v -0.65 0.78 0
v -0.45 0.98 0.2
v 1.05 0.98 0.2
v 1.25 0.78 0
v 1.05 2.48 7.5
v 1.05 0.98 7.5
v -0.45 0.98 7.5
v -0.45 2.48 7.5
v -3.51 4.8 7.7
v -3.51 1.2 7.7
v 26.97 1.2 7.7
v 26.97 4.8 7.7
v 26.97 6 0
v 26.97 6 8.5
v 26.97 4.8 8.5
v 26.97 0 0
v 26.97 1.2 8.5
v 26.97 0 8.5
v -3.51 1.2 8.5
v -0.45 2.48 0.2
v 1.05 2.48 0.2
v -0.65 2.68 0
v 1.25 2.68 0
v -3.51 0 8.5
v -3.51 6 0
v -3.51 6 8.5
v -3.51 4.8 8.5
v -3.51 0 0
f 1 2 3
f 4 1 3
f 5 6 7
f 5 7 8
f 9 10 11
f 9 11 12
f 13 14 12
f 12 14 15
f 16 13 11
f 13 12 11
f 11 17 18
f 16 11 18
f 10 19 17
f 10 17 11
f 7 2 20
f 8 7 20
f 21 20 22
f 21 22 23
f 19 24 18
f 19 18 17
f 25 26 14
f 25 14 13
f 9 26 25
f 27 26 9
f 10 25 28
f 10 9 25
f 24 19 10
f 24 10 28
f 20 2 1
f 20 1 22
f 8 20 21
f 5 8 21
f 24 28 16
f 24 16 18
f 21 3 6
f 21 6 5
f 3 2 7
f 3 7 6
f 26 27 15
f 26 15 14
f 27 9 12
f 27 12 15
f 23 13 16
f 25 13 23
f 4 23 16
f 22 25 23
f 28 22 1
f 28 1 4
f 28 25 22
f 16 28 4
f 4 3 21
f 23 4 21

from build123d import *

# Parameters (mm, degrees)
PAD001_DEPTH    = 30.48
SKETCH003_W     = 1.5
SKETCH003_H     = 1.5
POCKET_DEPTH    = 7.5
CHAMFER008_SIZE = 0.2


with BuildPart() as part:
    # Sketch001 → Pad001 (new body)
    with BuildSketch(Plane.YZ.offset(-3.51)):
        Polygon((0, 8.5), (1.2, 8.5), (1.2, 7.7), (4.8, 7.7), (4.8, 8.5), (6, 8.5), (6, 0), (0, 0), align=None)
    extrude(amount=PAD001_DEPTH)

    # Sketch003 → Pocket (cut)
    with BuildSketch(Plane(origin=(-3.51, 0, 0), x_dir=(0, 1, 0), z_dir=(0, 0, -1))):
        with Locations((1.73, 3.81)):
            Rectangle(SKETCH003_W, SKETCH003_H)
    extrude(amount=-POCKET_DEPTH, mode=Mode.SUBTRACT)

    # Chamfer008
    chamfer008_edges = [part.edges().sort_by_distance(p)[0] for p in [
        (-0.45, 1.73, 0),
        (0.3, 2.48, 0),
        (1.05, 1.73, 0),
        (0.3, 0.98, 0),
    ]]
    chamfer(chamfer008_edges, length=CHAMFER008_SIZE)


solid = part.part
